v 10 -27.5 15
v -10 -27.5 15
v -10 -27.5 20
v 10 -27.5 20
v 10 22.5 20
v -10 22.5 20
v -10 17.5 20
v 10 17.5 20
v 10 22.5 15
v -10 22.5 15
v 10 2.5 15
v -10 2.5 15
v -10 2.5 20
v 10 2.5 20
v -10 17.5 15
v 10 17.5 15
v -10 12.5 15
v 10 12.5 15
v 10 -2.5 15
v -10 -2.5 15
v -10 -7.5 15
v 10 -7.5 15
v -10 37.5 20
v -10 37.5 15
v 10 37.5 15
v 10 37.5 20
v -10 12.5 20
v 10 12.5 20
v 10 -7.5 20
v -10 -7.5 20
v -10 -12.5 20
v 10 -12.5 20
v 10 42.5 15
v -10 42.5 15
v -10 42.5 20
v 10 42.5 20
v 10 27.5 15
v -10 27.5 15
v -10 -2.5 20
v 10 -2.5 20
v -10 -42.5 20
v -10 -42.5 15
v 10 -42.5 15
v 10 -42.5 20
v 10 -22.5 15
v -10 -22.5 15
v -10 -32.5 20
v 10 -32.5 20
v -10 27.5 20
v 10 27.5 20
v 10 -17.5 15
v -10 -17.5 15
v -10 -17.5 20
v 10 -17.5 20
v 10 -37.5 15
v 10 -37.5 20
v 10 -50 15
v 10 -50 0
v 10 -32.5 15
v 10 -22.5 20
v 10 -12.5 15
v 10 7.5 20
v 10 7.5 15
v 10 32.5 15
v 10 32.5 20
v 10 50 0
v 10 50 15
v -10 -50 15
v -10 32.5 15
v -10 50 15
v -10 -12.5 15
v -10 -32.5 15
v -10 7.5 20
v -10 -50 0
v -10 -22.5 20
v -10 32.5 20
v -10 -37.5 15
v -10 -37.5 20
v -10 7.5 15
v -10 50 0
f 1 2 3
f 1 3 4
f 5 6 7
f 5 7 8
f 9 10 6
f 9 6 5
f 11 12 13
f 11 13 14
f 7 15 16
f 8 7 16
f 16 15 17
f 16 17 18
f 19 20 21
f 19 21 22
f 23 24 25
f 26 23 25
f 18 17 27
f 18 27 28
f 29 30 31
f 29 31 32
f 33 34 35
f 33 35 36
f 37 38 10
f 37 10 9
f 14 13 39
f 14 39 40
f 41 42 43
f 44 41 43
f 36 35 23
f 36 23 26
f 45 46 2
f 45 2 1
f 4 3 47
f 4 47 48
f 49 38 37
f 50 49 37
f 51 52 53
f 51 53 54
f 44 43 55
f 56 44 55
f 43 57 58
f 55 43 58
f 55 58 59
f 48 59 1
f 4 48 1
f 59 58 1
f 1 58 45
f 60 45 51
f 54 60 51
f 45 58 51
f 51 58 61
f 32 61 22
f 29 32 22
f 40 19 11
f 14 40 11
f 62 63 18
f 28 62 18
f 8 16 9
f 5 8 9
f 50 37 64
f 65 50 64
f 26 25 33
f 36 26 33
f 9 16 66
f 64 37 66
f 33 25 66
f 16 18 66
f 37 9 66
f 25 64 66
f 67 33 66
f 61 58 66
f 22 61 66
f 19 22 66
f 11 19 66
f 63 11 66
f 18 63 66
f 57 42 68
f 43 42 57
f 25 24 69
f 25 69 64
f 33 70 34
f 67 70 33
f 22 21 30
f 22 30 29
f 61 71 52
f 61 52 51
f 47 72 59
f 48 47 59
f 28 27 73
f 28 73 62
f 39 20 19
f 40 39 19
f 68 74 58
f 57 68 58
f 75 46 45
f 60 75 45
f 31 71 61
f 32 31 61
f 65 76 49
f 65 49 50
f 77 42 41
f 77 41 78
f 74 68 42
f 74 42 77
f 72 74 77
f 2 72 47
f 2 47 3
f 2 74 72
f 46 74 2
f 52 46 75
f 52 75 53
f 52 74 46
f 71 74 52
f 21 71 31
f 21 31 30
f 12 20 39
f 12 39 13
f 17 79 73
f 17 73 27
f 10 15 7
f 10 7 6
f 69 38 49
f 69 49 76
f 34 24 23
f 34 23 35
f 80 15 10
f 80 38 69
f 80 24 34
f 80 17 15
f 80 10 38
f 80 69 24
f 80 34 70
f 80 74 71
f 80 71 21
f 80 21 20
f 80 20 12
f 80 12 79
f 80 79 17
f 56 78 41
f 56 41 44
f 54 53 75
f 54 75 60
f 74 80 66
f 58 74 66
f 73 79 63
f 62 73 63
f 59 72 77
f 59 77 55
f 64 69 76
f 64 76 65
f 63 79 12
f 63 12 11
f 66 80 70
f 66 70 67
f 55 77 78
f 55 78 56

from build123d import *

# Parameters (mm, degrees)
SKETCH1_W           = 20
SKETCH1_H           = 100
BOSS_EXTRUDE1_DEPTH = 15
SKETCH2_W           = 20
SKETCH2_H           = 5
BOSS_EXTRUDE2_DEPTH = 5


with BuildPart() as part:
    # Sketch1 → Boss-Extrude1 (new body)
    with BuildSketch(Plane.XY):
        Rectangle(SKETCH1_W, SKETCH1_H)
    extrude(amount=BOSS_EXTRUDE1_DEPTH)

    # Sketch2 → Boss-Extrude2 (add)
    with BuildSketch(Plane.XY.offset(15)):
        Rectangle(SKETCH2_W, SKETCH2_H)
        with Locations((0, -10)):
            Rectangle(SKETCH2_W, SKETCH2_H)
        with Locations((0, -20)):
            Rectangle(SKETCH2_W, SKETCH2_H)
        with Locations((0, -30)):
            Rectangle(SKETCH2_W, SKETCH2_H)
        with Locations((0, -40)):
            Rectangle(SKETCH2_W, SKETCH2_H)
        with Locations((0, 10)):
            Rectangle(SKETCH2_W, SKETCH2_H)
        with Locations((0, 20)):
            Rectangle(SKETCH2_W, SKETCH2_H)
        with Locations((0, 30)):
            Rectangle(SKETCH2_W, SKETCH2_H)
        with Locations((0, 40)):
            Rectangle(SKETCH2_W, SKETCH2_H)
    extrude(amount=BOSS_EXTRUDE2_DEPTH)


solid = part.part
